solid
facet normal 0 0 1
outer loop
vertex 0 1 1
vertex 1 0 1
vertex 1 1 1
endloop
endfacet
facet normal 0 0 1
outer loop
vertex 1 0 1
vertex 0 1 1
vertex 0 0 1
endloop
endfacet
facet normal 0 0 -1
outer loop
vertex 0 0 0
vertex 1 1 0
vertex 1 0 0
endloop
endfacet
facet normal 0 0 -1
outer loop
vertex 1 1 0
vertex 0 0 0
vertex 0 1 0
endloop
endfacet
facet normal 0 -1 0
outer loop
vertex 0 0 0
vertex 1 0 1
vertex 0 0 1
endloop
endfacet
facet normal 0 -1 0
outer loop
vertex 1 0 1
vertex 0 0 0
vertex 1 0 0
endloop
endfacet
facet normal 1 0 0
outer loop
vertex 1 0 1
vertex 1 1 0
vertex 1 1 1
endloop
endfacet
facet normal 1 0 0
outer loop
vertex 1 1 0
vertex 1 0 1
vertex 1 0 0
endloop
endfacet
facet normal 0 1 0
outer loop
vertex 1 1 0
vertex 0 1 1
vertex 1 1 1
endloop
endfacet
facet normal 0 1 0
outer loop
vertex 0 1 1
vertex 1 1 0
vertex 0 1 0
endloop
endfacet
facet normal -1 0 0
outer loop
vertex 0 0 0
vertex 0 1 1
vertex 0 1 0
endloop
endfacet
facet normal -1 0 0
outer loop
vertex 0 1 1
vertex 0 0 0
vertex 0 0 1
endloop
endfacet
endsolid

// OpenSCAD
/*
 * OpenSCAD Workshop Examples
 * Copyright (c) 2013 Anar Software LLC. < http://anars.com >
 *
 * This program is free software: you can redistribute it and/or modify it under
 * the terms of the GNU General Public License as published by the Free Software
 * Foundation, either version 3 of the License, or (at your option) any later
 * version.
 *
 * This program is distributed in the hope that it will be useful, but WITHOUT
 * ANY WARRANTY; without even the implied warranty of MERCHANTABILITY or FITNESS
 * FOR A PARTICULAR PURPOSE. See the GNU General Public License for more details.
 *
 * You should have received a copy of the GNU General Public License along with
 * this program. If not, see < http://www.gnu.org/licenses/ >
 *
 */
/*

Creates a cube with sides of that 1 unit length in the first octant.

*/

cube();
